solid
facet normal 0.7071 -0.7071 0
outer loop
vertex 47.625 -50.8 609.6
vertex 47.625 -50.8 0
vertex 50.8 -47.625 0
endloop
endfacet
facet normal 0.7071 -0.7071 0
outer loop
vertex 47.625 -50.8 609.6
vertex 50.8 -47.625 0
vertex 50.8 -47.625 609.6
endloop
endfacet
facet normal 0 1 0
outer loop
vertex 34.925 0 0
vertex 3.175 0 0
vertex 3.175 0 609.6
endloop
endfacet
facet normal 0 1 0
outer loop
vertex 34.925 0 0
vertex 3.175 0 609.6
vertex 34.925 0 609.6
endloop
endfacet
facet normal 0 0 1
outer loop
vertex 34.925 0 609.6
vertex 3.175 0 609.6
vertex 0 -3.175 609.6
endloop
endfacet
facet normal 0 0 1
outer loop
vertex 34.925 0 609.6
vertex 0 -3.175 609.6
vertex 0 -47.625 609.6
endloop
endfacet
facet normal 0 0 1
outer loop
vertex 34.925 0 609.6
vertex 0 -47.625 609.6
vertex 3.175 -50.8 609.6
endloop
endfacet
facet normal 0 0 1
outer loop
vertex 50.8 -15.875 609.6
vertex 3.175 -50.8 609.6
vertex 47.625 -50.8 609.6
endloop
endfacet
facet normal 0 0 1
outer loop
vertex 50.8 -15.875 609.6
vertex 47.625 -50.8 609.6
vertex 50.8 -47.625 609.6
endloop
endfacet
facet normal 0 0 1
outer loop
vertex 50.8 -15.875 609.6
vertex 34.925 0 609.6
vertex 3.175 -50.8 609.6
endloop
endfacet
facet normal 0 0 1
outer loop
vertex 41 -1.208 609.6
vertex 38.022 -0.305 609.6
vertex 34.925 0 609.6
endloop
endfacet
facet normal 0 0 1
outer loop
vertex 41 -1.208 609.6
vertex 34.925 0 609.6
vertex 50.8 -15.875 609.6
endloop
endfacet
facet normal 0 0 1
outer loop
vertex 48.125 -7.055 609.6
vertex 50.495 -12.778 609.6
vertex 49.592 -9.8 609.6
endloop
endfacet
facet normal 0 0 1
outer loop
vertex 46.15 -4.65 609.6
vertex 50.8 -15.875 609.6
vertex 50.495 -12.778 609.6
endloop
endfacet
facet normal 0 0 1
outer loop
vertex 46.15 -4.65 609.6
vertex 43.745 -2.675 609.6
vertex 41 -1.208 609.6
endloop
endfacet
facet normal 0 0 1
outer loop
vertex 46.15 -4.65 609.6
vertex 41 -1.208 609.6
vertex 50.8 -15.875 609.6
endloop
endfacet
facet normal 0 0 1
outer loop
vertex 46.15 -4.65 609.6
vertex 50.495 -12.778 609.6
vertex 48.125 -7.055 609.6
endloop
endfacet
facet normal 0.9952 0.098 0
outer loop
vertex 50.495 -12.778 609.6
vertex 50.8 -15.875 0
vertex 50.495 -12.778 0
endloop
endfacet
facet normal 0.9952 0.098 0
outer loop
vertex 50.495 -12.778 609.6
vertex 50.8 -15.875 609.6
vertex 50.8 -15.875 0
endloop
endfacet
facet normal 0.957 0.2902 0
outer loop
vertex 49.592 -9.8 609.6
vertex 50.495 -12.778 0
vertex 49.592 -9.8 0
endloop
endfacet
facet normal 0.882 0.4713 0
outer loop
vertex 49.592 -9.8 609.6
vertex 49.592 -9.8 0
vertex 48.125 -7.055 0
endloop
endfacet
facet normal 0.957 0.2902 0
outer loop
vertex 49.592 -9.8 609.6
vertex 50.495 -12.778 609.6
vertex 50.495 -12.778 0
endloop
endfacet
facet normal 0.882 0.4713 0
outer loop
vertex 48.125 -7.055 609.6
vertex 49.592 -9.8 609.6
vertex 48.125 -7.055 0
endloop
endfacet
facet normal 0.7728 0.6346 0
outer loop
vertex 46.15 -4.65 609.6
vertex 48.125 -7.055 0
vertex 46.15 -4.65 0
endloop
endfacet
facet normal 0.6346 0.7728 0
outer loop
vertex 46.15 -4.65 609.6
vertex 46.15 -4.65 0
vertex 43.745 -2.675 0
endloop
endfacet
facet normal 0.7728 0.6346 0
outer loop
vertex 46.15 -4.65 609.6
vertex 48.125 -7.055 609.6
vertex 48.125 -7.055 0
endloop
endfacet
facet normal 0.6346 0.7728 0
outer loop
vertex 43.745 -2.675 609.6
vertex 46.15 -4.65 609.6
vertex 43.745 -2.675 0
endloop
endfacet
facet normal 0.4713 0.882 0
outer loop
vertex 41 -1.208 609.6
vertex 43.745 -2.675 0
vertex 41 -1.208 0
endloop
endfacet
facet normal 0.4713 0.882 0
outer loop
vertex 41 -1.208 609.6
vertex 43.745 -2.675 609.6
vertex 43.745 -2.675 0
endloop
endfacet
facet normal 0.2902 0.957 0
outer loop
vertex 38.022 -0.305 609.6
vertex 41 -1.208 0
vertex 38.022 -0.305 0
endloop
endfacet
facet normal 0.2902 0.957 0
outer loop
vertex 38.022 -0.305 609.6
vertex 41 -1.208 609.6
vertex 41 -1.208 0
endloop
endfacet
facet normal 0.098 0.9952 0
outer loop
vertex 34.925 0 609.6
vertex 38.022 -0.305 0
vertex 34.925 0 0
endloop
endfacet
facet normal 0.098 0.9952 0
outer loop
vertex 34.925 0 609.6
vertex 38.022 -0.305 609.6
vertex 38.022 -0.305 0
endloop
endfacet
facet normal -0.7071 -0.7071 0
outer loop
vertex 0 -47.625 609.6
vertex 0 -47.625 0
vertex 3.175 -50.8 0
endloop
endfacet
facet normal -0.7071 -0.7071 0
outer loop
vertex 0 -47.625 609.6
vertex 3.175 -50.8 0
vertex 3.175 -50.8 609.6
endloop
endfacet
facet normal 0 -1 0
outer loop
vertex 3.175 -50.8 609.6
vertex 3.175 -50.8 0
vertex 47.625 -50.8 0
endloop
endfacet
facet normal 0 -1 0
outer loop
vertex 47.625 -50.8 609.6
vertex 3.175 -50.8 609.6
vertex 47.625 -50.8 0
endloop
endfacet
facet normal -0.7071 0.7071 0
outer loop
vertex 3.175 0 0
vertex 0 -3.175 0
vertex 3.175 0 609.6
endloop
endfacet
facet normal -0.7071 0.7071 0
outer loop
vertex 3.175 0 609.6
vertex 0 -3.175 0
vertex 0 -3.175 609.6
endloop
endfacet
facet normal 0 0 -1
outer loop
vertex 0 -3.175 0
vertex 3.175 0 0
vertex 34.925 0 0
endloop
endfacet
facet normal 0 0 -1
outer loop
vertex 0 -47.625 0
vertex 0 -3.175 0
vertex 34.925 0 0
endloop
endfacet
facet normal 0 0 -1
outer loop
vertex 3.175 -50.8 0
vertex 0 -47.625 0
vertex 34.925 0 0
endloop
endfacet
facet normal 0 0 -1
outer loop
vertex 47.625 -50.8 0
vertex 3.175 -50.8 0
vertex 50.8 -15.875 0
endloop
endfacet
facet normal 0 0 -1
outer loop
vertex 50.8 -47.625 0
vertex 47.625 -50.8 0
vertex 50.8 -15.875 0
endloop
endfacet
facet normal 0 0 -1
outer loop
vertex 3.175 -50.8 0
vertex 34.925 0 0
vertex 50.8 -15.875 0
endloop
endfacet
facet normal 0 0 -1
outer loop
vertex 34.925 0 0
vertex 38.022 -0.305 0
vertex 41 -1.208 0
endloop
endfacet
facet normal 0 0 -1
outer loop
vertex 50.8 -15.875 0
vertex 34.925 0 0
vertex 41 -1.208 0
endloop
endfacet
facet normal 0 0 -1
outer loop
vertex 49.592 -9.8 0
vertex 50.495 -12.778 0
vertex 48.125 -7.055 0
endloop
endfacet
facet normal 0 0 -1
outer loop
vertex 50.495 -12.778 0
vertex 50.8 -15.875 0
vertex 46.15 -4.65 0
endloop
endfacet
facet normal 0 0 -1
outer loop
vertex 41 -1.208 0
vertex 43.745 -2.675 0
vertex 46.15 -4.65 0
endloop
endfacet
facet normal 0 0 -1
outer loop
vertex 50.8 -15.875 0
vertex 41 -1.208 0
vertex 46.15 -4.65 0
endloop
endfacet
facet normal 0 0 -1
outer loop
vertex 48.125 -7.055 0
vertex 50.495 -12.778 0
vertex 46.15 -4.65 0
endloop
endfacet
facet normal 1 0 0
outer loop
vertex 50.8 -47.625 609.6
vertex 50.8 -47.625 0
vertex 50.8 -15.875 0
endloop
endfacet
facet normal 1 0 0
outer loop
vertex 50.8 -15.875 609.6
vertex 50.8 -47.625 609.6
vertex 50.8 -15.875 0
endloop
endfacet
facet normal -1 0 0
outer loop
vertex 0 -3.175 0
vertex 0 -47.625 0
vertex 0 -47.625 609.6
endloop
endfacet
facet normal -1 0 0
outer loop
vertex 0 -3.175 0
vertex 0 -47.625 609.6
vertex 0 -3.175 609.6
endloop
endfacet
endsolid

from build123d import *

# Parameters (mm, degrees)
F0_W     = 50.8
F0_H     = 50.8
F1_DEPTH = 609.6
F2_R     = 15.875
F3_SIZE  = 3.175


with BuildPart() as f1:
    # F0 (on Top) → F1 (new body)
    with BuildSketch(Plane.XY):
        with Locations((25.4, -25.4)):
            Rectangle(F0_W, F0_H)
    extrude(amount=F1_DEPTH)

    # F2
    f2_edges = [f1.edges().sort_by_distance(p)[0] for p in [
        (50.8, 0, 304.8),
    ]]
    fillet(f2_edges, radius=F2_R)

    # F3
    f3_edges = [f1.edges().sort_by_distance(p)[0] for p in [
        (0, 0, 304.8),
        (0, -50.8, 304.8),
        (50.8, -50.8, 304.8),
    ]]
    chamfer(f3_edges, length=F3_SIZE)


solid = f1.part
